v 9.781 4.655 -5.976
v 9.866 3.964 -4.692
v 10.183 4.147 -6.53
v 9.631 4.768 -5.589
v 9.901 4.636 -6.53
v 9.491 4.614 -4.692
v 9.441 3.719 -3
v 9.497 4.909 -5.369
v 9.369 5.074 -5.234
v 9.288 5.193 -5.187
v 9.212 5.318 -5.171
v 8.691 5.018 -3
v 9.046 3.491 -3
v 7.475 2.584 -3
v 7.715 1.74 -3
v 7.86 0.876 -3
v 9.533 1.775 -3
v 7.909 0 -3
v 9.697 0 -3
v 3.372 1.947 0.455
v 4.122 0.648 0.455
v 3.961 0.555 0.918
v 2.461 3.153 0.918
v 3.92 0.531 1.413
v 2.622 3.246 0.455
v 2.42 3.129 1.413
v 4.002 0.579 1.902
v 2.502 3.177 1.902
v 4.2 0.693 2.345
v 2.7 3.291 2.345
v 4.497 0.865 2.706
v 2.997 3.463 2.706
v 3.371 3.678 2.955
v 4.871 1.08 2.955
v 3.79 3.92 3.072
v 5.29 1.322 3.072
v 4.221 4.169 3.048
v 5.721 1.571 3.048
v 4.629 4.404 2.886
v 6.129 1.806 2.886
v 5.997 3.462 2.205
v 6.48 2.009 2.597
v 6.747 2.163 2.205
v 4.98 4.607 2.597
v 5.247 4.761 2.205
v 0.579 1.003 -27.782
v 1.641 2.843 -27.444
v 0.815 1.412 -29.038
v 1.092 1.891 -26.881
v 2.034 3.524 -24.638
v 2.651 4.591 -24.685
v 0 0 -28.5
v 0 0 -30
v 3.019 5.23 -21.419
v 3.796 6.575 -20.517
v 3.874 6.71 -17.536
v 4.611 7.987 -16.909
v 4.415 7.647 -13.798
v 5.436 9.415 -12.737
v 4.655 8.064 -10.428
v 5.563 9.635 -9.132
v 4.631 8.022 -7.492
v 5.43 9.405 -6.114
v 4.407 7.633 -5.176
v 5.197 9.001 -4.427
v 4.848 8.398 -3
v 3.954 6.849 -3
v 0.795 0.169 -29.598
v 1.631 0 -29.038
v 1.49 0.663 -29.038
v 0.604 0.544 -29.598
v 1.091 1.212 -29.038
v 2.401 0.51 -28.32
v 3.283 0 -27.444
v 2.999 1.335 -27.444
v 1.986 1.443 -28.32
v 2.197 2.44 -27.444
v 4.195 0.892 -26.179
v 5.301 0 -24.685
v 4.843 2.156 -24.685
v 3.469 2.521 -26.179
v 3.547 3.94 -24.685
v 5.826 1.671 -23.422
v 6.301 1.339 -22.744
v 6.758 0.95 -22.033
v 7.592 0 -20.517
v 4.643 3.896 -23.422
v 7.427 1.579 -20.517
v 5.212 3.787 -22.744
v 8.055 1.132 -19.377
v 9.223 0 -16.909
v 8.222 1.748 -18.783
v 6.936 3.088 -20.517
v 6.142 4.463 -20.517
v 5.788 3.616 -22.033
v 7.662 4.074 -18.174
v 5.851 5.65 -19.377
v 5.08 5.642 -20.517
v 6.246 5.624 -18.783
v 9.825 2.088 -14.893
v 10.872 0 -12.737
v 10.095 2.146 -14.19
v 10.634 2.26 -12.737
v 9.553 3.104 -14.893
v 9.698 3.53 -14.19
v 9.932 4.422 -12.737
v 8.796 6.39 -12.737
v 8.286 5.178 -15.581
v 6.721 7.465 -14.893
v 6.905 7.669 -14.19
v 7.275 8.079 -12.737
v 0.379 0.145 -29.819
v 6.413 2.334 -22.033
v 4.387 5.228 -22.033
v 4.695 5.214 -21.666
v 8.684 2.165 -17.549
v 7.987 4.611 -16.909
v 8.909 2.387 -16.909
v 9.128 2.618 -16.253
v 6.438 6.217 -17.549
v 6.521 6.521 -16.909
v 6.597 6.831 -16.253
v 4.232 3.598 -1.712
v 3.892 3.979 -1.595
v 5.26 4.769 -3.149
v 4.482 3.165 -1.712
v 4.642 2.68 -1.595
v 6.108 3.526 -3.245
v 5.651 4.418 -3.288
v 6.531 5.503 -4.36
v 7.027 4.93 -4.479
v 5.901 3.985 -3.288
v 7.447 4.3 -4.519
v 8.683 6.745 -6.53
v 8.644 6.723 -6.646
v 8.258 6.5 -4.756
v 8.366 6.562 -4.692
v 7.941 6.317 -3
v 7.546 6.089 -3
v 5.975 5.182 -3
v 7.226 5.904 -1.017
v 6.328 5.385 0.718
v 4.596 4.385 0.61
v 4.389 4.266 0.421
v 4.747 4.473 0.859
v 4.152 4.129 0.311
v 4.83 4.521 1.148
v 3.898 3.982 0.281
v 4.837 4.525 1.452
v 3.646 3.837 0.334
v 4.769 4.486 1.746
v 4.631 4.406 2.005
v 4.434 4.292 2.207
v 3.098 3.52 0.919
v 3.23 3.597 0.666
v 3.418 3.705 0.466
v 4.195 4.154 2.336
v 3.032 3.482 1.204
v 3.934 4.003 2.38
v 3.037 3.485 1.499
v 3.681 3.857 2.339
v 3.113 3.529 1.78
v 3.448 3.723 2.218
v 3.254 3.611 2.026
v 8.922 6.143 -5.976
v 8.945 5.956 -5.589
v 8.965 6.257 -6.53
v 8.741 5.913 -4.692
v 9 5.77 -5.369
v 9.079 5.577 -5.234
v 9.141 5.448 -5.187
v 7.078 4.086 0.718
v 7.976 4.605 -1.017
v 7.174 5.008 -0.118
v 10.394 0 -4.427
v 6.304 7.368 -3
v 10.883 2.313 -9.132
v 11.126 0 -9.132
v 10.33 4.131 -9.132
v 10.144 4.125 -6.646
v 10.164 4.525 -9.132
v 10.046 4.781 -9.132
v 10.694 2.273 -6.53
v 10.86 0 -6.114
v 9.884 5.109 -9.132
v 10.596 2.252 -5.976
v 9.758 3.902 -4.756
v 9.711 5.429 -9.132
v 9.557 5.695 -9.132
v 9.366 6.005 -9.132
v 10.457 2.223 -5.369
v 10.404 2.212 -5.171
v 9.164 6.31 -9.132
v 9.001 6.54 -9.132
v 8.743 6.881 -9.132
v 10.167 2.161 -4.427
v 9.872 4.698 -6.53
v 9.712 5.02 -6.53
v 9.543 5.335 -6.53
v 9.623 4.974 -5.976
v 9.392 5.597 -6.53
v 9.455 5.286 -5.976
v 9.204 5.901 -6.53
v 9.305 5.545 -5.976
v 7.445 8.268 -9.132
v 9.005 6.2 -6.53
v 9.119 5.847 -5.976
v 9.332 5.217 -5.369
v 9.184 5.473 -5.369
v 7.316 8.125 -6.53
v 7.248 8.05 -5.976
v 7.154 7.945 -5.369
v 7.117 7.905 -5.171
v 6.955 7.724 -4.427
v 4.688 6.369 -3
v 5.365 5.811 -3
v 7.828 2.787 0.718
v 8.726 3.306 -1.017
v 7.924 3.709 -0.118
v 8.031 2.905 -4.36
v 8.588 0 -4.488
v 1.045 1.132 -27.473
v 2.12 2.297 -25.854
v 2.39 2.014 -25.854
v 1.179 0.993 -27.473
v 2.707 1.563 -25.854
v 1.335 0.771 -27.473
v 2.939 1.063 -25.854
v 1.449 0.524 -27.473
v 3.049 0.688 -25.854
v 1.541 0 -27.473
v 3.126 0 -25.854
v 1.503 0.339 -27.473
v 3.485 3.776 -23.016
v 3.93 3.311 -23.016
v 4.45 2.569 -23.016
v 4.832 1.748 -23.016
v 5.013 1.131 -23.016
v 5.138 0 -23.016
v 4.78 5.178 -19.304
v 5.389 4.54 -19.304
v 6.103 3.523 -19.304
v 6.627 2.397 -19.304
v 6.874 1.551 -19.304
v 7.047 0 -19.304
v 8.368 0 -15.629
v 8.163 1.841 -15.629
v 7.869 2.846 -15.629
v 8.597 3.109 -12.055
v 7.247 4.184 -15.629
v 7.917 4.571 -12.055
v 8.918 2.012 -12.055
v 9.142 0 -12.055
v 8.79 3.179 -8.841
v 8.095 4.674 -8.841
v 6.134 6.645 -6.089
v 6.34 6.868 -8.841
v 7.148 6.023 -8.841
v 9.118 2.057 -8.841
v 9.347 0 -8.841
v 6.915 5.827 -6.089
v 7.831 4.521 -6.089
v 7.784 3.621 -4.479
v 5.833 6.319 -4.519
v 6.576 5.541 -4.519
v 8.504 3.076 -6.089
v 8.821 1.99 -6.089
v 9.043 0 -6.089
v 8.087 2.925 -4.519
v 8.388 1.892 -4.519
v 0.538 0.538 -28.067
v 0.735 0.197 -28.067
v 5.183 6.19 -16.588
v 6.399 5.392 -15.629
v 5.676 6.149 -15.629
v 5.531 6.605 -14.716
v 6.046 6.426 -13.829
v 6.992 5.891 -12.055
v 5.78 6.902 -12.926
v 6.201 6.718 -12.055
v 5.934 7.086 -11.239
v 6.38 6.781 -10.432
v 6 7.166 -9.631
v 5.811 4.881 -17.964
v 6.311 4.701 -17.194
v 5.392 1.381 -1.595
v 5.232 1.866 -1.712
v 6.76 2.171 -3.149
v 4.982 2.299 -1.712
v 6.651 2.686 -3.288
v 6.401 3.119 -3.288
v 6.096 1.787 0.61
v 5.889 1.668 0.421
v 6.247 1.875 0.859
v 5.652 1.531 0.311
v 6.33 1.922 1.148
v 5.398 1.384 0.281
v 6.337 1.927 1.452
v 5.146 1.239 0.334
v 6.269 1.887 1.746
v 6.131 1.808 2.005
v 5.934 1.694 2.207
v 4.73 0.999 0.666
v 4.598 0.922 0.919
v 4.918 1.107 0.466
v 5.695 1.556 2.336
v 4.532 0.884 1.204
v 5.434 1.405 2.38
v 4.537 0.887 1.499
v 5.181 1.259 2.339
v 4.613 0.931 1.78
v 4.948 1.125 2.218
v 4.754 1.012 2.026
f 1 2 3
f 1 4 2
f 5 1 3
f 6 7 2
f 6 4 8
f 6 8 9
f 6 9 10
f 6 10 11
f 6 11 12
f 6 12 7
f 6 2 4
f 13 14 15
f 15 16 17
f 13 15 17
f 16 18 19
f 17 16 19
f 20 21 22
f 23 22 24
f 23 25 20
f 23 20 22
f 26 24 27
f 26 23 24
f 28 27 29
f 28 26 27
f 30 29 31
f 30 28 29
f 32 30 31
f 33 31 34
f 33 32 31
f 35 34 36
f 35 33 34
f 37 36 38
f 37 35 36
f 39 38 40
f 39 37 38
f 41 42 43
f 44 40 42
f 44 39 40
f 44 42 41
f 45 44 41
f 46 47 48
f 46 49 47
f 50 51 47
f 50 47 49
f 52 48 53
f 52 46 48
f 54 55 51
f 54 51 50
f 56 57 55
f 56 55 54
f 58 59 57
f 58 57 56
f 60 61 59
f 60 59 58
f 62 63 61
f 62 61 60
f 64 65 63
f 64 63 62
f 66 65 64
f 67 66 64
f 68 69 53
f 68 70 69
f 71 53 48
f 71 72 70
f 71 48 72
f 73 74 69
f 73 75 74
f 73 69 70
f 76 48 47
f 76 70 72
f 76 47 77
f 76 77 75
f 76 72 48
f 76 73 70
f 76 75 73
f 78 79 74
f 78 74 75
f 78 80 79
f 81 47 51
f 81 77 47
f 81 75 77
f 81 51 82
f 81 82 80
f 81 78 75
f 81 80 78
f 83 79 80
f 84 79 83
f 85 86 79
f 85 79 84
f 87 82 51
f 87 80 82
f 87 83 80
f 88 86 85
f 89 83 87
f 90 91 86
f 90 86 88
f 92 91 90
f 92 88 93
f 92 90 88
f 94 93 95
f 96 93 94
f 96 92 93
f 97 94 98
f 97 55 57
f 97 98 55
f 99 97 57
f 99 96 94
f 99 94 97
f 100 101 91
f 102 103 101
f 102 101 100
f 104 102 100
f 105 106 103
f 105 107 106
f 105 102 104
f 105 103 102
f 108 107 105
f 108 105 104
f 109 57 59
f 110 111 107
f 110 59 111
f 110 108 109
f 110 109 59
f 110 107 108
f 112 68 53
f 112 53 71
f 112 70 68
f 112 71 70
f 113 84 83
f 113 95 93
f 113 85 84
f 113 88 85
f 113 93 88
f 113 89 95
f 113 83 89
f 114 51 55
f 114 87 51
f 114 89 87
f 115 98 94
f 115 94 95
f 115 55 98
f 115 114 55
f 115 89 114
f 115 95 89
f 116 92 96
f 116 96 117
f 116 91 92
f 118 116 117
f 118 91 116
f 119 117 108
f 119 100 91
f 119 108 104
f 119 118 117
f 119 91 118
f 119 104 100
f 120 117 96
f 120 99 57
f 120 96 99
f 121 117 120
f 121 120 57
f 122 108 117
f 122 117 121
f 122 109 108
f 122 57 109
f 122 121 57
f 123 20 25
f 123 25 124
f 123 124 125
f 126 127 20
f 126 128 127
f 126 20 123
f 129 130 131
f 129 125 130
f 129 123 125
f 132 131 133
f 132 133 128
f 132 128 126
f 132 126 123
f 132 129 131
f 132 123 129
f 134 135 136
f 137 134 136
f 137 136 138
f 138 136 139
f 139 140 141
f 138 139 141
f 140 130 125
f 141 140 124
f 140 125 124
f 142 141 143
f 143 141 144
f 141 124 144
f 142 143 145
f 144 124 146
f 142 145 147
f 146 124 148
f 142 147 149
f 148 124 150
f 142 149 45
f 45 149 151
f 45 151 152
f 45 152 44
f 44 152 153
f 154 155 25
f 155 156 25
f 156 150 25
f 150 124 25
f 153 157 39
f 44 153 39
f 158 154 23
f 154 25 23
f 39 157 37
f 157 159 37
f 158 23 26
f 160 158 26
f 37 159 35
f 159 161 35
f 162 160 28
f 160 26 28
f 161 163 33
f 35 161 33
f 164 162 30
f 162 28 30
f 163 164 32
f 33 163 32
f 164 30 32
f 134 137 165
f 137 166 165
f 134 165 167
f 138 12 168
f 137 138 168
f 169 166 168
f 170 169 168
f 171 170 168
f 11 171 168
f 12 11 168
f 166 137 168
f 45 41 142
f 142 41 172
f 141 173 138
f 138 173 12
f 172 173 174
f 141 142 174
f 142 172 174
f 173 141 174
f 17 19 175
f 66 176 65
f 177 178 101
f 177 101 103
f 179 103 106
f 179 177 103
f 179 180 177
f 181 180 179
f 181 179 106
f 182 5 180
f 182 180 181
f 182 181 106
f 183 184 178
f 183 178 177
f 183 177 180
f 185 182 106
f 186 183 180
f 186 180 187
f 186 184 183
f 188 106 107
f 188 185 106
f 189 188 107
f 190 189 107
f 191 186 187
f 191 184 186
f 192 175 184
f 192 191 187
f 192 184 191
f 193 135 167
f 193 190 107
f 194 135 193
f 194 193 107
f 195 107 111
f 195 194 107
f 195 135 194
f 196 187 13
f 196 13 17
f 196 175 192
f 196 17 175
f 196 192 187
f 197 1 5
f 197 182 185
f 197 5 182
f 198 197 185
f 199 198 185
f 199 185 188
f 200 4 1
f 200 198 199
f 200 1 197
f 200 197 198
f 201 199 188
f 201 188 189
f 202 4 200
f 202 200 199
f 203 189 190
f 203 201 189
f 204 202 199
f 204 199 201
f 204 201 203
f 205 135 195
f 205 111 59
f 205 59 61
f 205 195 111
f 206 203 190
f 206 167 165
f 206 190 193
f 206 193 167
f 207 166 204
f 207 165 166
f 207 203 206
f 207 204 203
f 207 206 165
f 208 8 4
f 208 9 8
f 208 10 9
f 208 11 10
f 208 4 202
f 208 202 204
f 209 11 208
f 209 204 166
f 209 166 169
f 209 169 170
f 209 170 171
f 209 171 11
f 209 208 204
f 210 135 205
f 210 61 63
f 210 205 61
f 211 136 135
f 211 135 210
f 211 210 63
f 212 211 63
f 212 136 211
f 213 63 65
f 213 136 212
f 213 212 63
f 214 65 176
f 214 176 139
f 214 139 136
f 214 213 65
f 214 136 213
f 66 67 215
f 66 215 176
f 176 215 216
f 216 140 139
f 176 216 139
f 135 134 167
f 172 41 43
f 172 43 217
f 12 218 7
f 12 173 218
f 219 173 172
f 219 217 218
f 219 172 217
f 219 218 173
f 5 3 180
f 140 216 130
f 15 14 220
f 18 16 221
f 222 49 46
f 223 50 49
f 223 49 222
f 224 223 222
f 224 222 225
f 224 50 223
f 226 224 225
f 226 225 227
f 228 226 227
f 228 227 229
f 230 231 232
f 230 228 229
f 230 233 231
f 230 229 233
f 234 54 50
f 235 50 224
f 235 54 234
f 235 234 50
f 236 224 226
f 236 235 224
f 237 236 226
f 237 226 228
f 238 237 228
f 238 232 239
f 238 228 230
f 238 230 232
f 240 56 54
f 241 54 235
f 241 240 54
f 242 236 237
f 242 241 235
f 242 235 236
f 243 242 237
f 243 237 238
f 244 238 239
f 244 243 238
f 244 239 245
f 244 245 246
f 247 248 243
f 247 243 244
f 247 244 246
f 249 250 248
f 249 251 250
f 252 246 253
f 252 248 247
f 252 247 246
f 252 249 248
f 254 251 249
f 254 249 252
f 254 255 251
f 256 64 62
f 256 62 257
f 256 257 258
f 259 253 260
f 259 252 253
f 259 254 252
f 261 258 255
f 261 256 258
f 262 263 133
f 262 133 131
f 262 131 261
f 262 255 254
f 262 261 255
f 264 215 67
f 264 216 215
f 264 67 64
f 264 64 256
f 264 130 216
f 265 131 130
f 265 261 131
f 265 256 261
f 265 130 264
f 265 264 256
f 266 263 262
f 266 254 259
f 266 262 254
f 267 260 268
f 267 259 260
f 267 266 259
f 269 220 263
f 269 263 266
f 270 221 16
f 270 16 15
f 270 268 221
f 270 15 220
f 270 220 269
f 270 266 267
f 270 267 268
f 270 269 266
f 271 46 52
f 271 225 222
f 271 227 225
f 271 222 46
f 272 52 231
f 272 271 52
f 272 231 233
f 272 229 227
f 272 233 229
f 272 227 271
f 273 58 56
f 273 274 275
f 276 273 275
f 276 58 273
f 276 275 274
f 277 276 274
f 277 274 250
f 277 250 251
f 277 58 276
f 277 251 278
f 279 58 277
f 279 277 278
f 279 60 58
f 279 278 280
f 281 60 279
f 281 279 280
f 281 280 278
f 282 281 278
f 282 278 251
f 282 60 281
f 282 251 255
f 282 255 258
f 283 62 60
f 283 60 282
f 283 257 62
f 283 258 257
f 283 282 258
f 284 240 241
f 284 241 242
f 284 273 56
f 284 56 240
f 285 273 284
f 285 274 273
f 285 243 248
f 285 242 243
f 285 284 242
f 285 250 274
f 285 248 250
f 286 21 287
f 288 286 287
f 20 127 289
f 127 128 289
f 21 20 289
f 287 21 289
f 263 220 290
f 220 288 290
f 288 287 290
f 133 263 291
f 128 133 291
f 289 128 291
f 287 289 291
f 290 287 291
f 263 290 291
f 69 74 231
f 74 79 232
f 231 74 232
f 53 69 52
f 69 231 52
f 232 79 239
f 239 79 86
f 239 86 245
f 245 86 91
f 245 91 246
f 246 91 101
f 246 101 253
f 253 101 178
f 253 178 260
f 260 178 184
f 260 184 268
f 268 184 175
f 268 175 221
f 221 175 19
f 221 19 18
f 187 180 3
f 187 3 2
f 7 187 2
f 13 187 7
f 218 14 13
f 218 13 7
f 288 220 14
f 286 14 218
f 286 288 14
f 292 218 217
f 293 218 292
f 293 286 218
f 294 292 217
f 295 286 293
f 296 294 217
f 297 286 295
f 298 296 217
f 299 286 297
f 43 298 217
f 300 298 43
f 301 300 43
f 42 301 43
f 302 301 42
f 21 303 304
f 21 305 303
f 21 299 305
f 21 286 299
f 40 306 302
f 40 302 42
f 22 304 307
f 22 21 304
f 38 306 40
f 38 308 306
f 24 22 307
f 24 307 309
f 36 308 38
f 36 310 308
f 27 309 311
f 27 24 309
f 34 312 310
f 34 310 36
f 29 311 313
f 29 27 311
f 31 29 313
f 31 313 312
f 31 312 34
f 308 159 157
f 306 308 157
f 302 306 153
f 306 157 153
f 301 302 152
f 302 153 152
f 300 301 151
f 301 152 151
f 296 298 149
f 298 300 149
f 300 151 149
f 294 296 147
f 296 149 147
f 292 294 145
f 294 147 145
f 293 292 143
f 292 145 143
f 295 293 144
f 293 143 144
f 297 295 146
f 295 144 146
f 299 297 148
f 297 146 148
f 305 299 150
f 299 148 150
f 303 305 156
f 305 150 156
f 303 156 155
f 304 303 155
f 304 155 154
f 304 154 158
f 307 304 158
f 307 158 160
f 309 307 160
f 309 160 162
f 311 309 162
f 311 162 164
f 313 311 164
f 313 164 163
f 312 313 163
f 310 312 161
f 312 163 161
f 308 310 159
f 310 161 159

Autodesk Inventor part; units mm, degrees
ref_plane "YZ Plane" through (0, 0, 0) normal (1, 0, 0) x (0, 1, 0)
sketch "Sketch1" plane through (0, 0, 0) normal (0, 1, 0) x (-1, 0, 0)
  line L0 (0, 0) -> (0, -30)
  line L1 (0, 0) -> (30, 0) construction
  spline S0 degree 2 poles (0, -30) (-5.2172, -27.9207) (-10.8719, -12.7372) knots 0 0 0 1 1 1
  line L2 (-10.8719, -12.7372) -> (-12.8062, 1.9407) construction
  line L3 (-12.8062, 1.9407) -> (0, 0) construction
  spline S1 degree 2 poles (-10.8719, -12.7372) (-12.8062, 1.9407) (0, 0) knots 1 1 1 2 2 2
  point P0 (-3.8105, -26.8078)
  dimension "d16" = 30
  dimension "d17" = 90
revolve "Revolution3" add sketch "Sketch1" angle 60 about axis through (0, 0, 0) along (0, 0, 1)
sketch "Sketch6" plane through (0, 0, -30) normal (0, -1, 0) x (1, 0, 0)
  line L0 (0, 30) -> (0, 27)
  line L1 (0, 30) -> (0, 0) projected
  line L2 (0, 27) -> (15, 27)
  line L3 (0, 0) -> (0, 1.5)
  spline S0 degree 3 poles (0, 1.5) (5.1775, 3.9151) (12.4804, 18.8279) (7.9089, 27) knots 0 0 0 0 1 1 1 1
  point P0 (4.4382, 5.8918)
  point P1 (8.9326, 16.7012)
  dimension "d19" = 3
  dimension "d20" = 15
  dimension "d21" = 1.5
revolve "Revolution4" cut sketch "Sketch6" angle 360 about axis through (0, 0, 0) along (0, 0, -1)
sketch "Sketch7" plane through (0, 0, -3) normal (0, -1, 0) x (1, 0, 0)
  line L0 (0, 3) -> (0, 0) projected
  line L1 (0, 0) -> (13, 0)
  line L2 (13, 0) -> (13, 5)
  line L3 (13, 5) -> (0, 5)
  line L4 (0, 5) -> (0, 0)
  dimension "d23" = 13
  dimension "d24" = 5
revolve "Revolution5" cut sketch "Sketch7" angle 360 about axis through (0, 0, 0) along (0, 0, -1)
sketch "Sketch8" plane through (0, 0, -30) normal (-0.866, 0.5, 0) x (0, 0, 1)
  line L0 (1.5, 0) -> (0, 0) projected
  line L1 (1.5, 0) -> (30, 0)
ref_plane "Work Plane2" through (0, 0, -28.5) normal (0.5, -0.866, 0) x (0, 0, 1)
sketch "Sketch9" plane through (0, 0, -28.5) normal (0.5, -0.866, 0) x (0, 0, 1)
  line L0 (25.5, -6.8493) -> (25.5, -8.3976) projected
  line L1 (25.5, -7.9089) -> (25.5, -6.8493) projected
  line L2 (25.5, -8.3976) -> (25.5, -7.9089)
  line L3 (25.5, -7.9089) -> (25.5, -13.2779)
  line L4 (25.5, -7.9089) -> (29.8301, -5.4089)
  line L5 (25.5, -7.9089) -> (30.5, -7.9089) construction
  circle A0 centre (29.8301, -5.4089) radius 1.75
  circle A1 centre (29.8301, -5.4089) radius 1.05
  spline S0 degree 2 poles (30.7051, -6.9244) (27.615, -9.9944) (21.9704, -10.8927) knots 0 0 0 1 1 1
  spline S1 degree 3 poles (28.9551, -3.8934) (23.9976, -6.7492) (23.8027, -11.1988) (20.2008, -10.2065) knots 0 0 0 0 1 1 1 1
  line L6 (21.9704, -10.8927) -> (20.2008, -10.2065)
  point P0 (28.5, 0)
  point P1 (27.284, -9.3075)
  point P2 (24.5466, -7.9089)
  point P3 (22.5368, -9.9569)
  dimension "d27" = 5
  dimension "d28" = 30
  dimension "d29" = 3.5
  dimension "d30" = 2.1
extrude "Extrusion2" add sketch "Sketch9" along normal mid plane 3
ref_plane "Work Plane3" through (0, 0, -28.5) normal (1, 0, 0) x (0, 0, 1)
properties part number "Innter_petal"
